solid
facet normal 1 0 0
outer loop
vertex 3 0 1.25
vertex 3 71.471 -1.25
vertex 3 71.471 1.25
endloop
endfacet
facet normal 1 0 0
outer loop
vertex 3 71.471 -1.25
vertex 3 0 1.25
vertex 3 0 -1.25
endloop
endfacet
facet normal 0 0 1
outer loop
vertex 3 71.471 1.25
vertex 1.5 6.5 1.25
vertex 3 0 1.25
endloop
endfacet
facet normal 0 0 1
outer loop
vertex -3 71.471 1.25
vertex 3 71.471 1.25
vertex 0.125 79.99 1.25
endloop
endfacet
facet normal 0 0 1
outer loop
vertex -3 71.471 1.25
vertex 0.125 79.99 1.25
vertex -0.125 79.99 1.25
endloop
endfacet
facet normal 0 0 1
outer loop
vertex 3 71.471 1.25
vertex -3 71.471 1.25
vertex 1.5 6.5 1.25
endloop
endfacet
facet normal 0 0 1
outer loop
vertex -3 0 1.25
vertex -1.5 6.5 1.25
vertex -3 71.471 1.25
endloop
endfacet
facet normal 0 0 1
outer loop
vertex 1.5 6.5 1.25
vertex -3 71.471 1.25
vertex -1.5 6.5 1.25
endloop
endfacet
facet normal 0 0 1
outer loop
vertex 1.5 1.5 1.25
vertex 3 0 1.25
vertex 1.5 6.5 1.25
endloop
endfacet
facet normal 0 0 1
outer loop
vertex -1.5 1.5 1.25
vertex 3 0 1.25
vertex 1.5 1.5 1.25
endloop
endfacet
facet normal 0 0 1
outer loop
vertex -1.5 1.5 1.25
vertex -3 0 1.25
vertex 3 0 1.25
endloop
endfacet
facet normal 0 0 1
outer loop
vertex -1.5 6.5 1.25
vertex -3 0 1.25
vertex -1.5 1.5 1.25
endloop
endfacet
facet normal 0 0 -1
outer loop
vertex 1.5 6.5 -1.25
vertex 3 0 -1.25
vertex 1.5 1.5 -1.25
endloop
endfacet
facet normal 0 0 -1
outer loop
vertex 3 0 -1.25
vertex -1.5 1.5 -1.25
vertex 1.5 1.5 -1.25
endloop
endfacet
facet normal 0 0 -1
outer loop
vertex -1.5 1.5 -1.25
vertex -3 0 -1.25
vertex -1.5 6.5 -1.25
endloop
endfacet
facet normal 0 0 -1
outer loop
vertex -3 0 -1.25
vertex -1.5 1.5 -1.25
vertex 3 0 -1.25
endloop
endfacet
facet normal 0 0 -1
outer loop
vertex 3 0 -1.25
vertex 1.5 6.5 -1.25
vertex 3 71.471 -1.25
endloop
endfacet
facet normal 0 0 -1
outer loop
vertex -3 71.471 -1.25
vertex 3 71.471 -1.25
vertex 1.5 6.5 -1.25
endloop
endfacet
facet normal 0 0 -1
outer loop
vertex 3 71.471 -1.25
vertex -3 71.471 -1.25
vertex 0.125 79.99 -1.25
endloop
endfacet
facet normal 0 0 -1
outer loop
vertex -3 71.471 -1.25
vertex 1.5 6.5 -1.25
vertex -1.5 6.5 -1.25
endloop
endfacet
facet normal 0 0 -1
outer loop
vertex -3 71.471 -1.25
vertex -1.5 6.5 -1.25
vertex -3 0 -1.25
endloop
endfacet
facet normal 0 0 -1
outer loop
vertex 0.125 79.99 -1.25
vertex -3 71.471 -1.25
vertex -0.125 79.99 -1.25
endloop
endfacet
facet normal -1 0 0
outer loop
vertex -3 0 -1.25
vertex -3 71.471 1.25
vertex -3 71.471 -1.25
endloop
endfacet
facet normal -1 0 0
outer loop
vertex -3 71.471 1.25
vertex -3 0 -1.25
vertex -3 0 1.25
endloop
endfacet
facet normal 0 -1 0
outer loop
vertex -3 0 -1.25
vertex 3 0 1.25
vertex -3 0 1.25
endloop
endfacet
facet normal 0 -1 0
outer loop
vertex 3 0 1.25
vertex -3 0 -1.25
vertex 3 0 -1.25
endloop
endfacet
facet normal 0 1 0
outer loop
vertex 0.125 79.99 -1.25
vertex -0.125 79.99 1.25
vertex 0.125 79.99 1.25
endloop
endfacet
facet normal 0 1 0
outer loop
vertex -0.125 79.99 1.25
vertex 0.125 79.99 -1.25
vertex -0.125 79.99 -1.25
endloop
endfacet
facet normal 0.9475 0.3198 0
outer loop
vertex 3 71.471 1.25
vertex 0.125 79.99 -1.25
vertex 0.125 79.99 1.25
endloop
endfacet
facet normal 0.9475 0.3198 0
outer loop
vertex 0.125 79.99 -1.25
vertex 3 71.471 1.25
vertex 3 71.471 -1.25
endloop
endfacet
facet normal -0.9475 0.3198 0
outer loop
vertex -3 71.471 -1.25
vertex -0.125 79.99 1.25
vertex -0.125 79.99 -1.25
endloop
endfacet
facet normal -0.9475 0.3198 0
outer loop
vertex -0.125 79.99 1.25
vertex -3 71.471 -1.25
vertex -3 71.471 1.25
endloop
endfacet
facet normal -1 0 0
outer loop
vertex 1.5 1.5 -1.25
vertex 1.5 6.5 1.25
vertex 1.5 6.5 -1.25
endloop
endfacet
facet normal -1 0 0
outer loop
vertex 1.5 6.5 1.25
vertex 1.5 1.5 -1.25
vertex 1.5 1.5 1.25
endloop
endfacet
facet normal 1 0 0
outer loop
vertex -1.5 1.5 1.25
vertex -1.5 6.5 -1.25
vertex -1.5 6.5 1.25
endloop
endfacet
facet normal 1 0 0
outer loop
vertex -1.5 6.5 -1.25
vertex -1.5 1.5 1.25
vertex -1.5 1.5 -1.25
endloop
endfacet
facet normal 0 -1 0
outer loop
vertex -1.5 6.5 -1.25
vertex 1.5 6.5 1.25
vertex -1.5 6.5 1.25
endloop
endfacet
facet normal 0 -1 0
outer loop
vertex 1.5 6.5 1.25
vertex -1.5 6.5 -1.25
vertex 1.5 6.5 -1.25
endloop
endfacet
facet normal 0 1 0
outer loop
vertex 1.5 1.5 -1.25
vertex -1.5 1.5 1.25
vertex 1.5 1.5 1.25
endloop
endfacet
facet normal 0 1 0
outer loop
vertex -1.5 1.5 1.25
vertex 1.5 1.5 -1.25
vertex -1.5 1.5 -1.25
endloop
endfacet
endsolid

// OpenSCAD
eye_w = 3;
eye_h = 5;
wall = 1.5;

tip = 10;
width = eye_w + (wall*2);
height = 80;
depth = 2.5;


$fn = 64;

difference() {
  union() {
    // body
    translate([width/-2, 0, depth/-2])
    cube([width, height - tip, depth]);

    // tip
    translate([0, height - tip - 0.01, 0])
      linear_extrude(height = depth, center=true)
      projection()
      intersection() {
        translate([0, 0, 0])
          rotate([-90, 0, 0])
          cylinder(h=tip, d1=width + 1, d2=0.25);

        translate([width/-2, 0, depth/-2])
          cube([width, height, depth]);
      }
  }

  // eye
  translate([0, (eye_h/2) + wall, 0])
    cube([eye_w, eye_h, depth*2], center=true);
}
